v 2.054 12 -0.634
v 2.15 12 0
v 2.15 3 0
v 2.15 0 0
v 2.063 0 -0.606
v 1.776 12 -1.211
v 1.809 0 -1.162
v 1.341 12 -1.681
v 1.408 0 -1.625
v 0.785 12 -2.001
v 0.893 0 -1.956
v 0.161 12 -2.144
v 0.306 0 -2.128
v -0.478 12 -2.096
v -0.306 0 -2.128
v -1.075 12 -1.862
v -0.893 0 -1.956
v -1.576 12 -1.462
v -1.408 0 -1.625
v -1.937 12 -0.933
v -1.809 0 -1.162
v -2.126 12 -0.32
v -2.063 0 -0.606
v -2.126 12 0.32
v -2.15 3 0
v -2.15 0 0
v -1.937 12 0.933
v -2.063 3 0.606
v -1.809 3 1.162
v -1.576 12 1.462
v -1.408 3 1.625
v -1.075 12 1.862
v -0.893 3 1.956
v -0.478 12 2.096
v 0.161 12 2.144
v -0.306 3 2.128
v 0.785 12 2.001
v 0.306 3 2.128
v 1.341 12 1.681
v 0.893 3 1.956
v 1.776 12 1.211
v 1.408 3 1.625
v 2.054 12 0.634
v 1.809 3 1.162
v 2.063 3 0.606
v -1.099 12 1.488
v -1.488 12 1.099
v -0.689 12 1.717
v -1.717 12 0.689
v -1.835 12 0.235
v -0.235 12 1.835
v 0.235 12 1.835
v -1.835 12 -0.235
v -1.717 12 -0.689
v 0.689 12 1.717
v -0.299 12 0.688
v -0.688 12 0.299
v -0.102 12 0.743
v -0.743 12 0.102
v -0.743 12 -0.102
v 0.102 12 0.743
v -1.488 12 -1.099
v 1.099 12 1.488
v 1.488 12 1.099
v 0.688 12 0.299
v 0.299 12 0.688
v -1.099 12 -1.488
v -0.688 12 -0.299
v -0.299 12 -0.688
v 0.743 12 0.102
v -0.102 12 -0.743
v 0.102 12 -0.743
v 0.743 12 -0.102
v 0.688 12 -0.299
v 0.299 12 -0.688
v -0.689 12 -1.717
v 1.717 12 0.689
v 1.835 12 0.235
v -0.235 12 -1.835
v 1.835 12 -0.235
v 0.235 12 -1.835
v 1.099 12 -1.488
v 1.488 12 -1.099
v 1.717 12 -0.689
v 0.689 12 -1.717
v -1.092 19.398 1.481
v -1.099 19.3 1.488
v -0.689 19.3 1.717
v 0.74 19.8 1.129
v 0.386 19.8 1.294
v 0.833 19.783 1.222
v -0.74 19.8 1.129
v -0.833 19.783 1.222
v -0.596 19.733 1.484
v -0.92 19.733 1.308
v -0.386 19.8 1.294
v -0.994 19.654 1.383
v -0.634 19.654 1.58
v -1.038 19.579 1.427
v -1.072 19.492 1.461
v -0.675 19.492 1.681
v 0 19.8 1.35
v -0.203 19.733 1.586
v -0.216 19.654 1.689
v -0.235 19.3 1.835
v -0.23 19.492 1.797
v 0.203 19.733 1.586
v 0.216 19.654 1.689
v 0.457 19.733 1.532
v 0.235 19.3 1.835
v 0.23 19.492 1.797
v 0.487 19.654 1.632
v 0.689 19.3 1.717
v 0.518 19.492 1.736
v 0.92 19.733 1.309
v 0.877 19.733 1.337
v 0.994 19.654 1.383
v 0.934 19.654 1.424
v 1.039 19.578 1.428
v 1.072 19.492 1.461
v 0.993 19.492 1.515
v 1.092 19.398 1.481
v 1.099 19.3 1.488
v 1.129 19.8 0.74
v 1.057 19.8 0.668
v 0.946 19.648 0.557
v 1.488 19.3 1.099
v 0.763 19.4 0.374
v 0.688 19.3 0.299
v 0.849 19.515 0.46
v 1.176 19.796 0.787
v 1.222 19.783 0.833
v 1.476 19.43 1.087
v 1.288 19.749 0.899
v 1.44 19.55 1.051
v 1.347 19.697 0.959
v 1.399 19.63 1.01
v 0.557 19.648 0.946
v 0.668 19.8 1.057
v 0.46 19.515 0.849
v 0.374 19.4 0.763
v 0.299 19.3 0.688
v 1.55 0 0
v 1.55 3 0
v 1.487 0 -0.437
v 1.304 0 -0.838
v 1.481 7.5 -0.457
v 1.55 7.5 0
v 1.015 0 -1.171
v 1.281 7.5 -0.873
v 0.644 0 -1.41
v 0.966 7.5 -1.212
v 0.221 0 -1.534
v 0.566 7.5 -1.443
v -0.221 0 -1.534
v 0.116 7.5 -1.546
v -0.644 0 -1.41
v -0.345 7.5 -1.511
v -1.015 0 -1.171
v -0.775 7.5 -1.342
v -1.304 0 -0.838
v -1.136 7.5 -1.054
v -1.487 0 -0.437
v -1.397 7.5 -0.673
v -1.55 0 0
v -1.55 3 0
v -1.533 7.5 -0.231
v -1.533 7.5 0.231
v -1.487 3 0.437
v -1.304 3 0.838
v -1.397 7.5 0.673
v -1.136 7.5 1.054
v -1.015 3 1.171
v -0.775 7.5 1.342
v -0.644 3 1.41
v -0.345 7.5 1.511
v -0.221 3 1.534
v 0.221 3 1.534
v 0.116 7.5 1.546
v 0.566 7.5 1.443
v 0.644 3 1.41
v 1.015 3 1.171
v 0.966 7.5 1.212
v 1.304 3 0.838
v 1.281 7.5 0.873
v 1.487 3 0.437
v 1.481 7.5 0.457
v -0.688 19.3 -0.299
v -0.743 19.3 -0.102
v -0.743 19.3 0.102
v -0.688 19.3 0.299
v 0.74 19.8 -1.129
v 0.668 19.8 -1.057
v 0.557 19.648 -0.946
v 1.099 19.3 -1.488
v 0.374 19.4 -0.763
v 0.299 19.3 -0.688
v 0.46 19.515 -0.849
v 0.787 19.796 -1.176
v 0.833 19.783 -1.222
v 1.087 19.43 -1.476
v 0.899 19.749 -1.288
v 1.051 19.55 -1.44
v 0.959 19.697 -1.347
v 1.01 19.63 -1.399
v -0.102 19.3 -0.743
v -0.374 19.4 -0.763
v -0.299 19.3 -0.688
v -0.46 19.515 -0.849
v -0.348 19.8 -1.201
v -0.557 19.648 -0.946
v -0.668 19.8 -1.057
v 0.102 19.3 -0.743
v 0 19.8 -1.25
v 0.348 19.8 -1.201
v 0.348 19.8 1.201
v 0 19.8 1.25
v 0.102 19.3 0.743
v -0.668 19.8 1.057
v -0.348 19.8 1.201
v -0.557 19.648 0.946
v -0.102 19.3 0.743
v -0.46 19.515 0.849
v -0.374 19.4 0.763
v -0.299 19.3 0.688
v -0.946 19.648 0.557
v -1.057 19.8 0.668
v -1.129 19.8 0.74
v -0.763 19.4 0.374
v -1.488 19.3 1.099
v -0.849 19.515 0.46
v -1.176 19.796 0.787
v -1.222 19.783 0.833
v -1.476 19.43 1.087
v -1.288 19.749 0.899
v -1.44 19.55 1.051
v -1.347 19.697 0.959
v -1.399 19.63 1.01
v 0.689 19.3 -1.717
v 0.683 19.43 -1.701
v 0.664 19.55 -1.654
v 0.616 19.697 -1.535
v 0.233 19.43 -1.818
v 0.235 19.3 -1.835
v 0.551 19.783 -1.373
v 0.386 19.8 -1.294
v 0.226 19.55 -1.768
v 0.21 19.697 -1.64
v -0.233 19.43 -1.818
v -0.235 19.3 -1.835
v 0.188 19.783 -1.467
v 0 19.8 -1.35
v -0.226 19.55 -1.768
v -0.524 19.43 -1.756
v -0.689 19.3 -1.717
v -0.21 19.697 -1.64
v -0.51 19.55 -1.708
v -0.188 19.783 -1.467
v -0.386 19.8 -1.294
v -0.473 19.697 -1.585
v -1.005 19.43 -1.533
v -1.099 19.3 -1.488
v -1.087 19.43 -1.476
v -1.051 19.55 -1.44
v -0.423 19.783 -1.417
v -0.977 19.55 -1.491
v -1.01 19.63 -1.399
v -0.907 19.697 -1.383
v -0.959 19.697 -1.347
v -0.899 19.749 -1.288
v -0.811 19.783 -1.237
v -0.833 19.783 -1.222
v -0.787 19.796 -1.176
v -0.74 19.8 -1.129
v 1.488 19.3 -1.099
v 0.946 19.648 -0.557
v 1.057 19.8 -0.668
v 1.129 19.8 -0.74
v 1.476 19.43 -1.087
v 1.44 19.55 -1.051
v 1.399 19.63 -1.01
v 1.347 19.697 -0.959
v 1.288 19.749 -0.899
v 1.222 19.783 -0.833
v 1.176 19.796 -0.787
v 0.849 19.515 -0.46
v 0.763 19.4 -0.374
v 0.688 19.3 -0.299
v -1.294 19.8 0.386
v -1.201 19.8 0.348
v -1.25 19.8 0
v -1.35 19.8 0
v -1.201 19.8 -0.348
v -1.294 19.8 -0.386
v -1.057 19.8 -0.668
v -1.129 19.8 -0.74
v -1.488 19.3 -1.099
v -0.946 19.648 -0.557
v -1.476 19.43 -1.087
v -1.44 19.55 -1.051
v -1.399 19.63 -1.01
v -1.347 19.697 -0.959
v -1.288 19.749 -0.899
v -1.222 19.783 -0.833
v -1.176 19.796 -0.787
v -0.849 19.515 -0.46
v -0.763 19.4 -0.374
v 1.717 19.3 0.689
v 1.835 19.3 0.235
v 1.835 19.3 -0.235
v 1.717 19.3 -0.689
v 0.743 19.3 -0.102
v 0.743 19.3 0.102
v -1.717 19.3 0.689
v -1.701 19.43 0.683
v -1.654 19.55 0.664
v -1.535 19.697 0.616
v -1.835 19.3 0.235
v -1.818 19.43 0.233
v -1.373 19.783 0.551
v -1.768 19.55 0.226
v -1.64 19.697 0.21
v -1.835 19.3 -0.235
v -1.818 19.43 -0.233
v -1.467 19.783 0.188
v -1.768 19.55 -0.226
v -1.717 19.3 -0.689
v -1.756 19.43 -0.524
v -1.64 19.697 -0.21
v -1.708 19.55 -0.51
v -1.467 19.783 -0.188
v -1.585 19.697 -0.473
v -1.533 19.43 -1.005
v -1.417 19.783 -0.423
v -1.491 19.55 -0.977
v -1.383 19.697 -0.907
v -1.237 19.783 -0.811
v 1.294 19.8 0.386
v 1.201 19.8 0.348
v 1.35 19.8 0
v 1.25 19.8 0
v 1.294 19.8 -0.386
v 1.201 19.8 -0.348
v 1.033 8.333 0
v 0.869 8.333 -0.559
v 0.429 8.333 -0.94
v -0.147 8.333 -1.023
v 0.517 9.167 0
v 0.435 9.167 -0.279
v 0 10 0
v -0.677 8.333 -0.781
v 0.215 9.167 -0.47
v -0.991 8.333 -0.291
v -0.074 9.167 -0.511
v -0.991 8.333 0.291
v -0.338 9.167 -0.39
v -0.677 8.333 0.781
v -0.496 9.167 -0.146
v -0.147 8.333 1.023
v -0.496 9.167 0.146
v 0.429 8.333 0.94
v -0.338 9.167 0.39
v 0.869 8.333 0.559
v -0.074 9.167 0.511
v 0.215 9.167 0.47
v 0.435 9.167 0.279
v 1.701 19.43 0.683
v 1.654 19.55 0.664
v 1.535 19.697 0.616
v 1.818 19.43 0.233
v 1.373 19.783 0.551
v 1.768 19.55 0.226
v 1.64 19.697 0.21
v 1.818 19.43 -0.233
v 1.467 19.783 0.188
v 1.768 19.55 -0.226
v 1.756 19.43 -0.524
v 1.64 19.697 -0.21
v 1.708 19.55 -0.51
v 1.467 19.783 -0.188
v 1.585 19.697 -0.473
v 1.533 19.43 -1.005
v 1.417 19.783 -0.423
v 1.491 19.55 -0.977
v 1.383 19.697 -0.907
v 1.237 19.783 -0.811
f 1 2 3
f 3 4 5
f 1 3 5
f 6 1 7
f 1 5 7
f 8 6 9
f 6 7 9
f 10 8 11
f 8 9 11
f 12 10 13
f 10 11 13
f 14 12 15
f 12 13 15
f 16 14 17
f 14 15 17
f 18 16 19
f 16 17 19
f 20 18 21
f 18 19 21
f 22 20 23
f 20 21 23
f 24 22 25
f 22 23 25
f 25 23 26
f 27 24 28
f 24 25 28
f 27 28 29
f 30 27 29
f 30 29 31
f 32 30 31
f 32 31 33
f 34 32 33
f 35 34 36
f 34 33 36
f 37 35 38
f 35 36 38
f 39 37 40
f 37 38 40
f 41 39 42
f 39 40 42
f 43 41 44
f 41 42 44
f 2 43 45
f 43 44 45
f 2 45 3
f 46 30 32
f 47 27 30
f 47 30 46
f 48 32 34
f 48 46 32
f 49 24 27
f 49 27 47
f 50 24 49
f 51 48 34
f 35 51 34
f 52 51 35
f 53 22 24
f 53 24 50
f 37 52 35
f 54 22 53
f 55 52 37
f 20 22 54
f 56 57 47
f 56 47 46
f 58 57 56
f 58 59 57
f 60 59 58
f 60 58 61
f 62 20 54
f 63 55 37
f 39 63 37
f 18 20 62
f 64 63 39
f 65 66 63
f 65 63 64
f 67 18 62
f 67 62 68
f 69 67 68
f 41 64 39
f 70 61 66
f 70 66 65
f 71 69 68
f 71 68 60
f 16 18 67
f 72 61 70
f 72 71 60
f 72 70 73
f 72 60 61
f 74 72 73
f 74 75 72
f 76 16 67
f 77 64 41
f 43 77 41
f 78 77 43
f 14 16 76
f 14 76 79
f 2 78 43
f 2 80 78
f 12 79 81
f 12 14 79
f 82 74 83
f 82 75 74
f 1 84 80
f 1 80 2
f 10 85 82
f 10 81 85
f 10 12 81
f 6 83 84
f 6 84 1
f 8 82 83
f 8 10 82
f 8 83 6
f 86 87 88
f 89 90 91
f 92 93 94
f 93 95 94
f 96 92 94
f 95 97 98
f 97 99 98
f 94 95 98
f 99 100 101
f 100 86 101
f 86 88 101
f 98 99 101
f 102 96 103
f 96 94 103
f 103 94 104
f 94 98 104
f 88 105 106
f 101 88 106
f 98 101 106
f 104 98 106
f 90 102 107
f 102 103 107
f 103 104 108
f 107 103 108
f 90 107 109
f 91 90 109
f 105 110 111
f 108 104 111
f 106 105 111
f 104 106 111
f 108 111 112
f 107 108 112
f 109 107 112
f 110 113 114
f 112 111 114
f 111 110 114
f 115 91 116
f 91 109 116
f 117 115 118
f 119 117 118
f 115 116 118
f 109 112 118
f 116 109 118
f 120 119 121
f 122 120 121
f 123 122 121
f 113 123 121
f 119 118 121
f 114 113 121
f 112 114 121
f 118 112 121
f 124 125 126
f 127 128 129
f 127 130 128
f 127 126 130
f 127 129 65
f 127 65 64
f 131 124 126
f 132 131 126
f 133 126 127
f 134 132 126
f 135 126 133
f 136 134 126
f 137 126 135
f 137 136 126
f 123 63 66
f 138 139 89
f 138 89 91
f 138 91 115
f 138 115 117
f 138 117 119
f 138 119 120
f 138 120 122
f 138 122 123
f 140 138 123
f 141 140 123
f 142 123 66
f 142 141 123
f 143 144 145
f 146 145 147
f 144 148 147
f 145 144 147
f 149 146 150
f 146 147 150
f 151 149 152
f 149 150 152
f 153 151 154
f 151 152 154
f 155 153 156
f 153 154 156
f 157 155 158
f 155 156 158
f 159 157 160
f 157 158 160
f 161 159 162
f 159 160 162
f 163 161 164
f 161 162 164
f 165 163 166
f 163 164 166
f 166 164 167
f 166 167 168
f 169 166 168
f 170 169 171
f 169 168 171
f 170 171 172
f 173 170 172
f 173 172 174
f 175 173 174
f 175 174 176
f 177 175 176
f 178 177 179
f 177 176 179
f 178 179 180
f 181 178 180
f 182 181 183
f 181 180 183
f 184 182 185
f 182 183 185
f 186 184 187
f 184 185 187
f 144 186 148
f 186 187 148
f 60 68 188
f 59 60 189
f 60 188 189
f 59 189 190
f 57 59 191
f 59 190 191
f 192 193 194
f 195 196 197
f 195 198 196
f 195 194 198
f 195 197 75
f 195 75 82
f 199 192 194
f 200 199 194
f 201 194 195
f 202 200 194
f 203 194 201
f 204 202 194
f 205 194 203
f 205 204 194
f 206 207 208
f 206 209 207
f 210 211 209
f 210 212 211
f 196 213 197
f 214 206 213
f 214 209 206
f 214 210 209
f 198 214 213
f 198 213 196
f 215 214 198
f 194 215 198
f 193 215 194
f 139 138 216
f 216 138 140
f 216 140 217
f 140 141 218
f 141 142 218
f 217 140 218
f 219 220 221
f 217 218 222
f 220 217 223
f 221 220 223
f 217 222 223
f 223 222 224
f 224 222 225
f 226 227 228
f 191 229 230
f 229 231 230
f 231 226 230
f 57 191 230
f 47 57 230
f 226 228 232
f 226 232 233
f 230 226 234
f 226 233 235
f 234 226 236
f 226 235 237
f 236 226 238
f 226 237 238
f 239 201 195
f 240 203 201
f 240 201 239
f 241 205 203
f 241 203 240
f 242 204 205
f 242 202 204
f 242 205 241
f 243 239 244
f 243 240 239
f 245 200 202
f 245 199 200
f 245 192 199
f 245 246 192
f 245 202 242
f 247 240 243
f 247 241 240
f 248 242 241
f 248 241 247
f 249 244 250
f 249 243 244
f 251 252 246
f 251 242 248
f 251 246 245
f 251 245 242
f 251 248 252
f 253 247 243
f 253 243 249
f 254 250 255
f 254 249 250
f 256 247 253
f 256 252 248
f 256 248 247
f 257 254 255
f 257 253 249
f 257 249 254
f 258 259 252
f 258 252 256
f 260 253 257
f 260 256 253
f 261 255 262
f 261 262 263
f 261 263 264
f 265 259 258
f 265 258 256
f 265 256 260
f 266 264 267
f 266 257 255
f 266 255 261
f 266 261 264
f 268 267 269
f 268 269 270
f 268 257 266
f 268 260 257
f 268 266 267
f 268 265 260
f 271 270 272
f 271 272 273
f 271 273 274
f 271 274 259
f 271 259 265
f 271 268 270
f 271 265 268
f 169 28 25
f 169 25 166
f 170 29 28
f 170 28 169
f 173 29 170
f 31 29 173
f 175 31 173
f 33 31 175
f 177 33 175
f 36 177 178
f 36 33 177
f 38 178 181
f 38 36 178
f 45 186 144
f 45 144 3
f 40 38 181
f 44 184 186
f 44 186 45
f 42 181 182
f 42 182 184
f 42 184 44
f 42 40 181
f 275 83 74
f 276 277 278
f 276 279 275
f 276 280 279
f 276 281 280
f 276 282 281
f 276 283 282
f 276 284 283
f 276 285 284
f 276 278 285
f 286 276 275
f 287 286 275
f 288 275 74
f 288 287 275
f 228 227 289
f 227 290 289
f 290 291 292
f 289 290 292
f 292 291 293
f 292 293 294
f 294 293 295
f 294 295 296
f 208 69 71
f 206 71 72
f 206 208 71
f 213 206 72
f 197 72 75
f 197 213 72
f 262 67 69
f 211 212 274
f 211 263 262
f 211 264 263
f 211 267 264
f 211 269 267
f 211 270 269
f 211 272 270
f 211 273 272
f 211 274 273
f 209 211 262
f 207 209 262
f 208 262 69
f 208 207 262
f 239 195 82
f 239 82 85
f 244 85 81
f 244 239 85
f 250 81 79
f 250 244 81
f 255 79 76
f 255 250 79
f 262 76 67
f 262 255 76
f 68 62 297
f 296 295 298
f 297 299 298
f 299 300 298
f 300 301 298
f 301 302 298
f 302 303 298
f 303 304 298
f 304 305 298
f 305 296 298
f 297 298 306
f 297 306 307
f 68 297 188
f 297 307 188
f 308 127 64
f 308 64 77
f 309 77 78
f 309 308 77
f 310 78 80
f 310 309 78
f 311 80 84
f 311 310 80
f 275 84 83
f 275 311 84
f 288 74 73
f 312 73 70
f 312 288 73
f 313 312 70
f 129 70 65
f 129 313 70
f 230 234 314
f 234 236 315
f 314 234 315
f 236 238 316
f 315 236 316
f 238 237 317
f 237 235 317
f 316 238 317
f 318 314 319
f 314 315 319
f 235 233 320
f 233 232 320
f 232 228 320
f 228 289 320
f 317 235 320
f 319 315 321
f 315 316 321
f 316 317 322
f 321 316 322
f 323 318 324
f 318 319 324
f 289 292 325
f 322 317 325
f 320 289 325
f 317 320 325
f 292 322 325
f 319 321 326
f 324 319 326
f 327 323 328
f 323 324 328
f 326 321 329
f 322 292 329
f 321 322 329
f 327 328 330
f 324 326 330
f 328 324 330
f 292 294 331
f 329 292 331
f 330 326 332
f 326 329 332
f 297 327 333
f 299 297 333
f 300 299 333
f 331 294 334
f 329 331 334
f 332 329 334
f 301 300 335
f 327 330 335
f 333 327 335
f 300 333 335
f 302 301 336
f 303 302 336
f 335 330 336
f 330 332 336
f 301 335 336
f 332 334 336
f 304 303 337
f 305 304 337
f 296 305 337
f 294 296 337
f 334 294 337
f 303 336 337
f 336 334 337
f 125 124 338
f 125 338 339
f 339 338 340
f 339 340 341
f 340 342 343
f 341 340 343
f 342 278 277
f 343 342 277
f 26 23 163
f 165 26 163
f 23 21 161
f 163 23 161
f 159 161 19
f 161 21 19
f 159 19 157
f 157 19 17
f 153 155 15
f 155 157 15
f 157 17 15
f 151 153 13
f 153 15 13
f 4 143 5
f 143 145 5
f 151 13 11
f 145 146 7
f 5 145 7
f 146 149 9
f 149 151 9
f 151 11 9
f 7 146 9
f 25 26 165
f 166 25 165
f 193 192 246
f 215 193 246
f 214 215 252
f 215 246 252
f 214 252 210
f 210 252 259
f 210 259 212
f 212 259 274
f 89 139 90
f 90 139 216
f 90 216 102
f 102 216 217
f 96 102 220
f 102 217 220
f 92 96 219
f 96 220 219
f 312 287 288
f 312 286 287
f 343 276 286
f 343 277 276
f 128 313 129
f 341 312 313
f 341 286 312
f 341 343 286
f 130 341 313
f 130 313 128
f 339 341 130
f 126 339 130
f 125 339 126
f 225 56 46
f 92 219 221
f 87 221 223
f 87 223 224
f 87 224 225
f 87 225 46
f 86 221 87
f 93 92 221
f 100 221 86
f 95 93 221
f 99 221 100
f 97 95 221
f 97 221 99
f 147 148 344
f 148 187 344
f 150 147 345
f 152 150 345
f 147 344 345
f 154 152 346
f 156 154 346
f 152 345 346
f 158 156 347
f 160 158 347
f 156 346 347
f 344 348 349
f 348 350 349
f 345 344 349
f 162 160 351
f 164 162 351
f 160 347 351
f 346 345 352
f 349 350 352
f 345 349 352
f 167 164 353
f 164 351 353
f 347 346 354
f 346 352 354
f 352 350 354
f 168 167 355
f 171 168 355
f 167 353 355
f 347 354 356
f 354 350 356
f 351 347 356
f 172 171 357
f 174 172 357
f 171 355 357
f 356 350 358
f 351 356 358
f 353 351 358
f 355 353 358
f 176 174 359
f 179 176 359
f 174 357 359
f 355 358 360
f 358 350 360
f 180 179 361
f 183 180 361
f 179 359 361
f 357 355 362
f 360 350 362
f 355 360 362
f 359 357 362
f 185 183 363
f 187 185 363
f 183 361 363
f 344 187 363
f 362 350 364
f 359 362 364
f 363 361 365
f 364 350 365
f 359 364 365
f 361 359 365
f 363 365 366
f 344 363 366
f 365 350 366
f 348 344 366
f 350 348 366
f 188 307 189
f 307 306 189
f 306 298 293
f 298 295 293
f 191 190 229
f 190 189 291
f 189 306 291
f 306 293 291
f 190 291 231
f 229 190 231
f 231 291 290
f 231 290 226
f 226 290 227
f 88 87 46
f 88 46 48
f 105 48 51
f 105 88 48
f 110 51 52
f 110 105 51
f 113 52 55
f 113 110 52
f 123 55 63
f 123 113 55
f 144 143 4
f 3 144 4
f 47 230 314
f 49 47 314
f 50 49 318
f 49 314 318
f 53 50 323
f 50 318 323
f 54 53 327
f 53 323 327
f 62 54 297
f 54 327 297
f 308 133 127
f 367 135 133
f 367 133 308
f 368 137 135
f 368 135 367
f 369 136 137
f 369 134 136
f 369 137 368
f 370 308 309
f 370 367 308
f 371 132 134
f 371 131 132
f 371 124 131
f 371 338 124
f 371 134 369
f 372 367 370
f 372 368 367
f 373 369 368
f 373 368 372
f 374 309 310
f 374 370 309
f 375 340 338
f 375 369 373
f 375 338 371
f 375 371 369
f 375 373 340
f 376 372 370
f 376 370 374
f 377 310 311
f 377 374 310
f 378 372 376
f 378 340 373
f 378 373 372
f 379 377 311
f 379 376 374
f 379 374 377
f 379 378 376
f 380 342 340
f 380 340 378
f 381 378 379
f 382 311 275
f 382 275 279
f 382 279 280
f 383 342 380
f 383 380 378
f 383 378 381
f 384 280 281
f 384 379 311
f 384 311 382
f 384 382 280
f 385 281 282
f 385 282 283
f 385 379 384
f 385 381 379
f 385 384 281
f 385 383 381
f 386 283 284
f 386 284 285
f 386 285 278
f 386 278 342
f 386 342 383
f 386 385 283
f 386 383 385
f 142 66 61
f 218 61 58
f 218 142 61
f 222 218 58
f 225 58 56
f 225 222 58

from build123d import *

# Parameters (mm, degrees)
CORTE_EXTRUS_O3_START = -7.8
ESBO_O2_R             = 2.15
CORTE_EXTRUS_O3_DEPTH = 7.8
ESBO_O3_W             = 4.788650246
ESBO_O3_H             = 2.452019704
CORTE_EXTRUS_O4_DEPTH = 3
CHANFRO1_SIZE         = 0.5
FILETE1_R             = 0.5


with BuildPart() as part:
    # Esboço1 → Revolução1 (revolve)
    with BuildSketch(Plane.XY):
        Polygon((0, 10), (0, 19.8), (2.15, 19.8), (2.15, 0), (1.55, 0), (1.55, 7.5), align=None)
    revolve(axis=Axis((0, 10, 0), (0, 1, 0)))

    # Esboço2 → Corte-extrusão3 (cut)
    with BuildSketch(Plane(origin=(0, 19.8, 0), x_dir=(1, 0, 0), z_dir=(0, 1, 0)).offset(CORTE_EXTRUS_O3_START)):
        Circle(ESBO_O2_R)
        with BuildLine():
            Line((-1.099159758, 1.488068488), (-0.298939494, 0.687848224))
            ThreePointArc((-0.298939494, 0.687848224), (0, 0.75), (0.298939494, 0.687848224))
            Line((0.298939494, 0.687848224), (1.099159758, 1.488068488))
            ThreePointArc((1.099159758, 1.488068488), (0, 1.85), (-1.099159758, 1.488068488))
        make_face(mode=Mode.SUBTRACT)
        with BuildLine():
            Line((-1.488068488, 1.099159758), (-0.687848224, 0.298939494))
            ThreePointArc((-0.687848224, 0.298939494), (-0.75, 0), (-0.687848224, -0.298939494))
            Line((-0.687848224, -0.298939494), (-1.488068488, -1.099159758))
            ThreePointArc((-1.488068488, -1.099159758), (-1.85, 0), (-1.488068488, 1.099159758))
        make_face(mode=Mode.SUBTRACT)
        with BuildLine():
            Line((1.099159758, -1.488068488), (0.298939494, -0.687848224))
            ThreePointArc((0.298939494, -0.687848224), (0, -0.75), (-0.298939494, -0.687848224))
            Line((-0.298939494, -0.687848224), (-1.099159758, -1.488068488))
            ThreePointArc((-1.099159758, -1.488068488), (0, -1.85), (1.099159758, -1.488068488))
        make_face(mode=Mode.SUBTRACT)
        with BuildLine():
            Line((1.488068488, 1.099159758), (0.687848224, 0.298939494))
            ThreePointArc((0.687848224, 0.298939494), (0.75, 0), (0.687848224, -0.298939494))
            Line((0.687848224, -0.298939494), (1.488068488, -1.099159758))
            ThreePointArc((1.488068488, -1.099159758), (1.85, 0), (1.488068488, 1.099159758))
        make_face(mode=Mode.SUBTRACT)
    extrude(amount=CORTE_EXTRUS_O3_DEPTH, mode=Mode.SUBTRACT)

    # Esboço3 → Corte-extrusão4 (cut)
    with BuildSketch(Plane.XZ):
        with Locations((0, 1.226009852)):
            Rectangle(ESBO_O3_W, ESBO_O3_H)
    extrude(amount=-CORTE_EXTRUS_O4_DEPTH, mode=Mode.SUBTRACT)

    # Chanfro1
    chanfro1_edges = [part.edges().sort_by_distance(p)[0] for p in [
        (0, 19.8, 0.75),
        (0.75, 19.8, 0),
        (0, 19.8, -0.75),
        (-0.75, 19.8, 0),
    ]]
    chamfer(chanfro1_edges, length=CHANFRO1_SIZE)

    # Filete1
    filete1_edges = [part.edges().sort_by_distance(p)[0] for p in [
        (1.85, 19.8, 0),
        (0, 19.8, -1.85),
        (0, 19.8, 1.85),
        (-1.85, 19.8, 0),
    ]]
    fillet(filete1_edges, radius=FILETE1_R)


solid = part.part
